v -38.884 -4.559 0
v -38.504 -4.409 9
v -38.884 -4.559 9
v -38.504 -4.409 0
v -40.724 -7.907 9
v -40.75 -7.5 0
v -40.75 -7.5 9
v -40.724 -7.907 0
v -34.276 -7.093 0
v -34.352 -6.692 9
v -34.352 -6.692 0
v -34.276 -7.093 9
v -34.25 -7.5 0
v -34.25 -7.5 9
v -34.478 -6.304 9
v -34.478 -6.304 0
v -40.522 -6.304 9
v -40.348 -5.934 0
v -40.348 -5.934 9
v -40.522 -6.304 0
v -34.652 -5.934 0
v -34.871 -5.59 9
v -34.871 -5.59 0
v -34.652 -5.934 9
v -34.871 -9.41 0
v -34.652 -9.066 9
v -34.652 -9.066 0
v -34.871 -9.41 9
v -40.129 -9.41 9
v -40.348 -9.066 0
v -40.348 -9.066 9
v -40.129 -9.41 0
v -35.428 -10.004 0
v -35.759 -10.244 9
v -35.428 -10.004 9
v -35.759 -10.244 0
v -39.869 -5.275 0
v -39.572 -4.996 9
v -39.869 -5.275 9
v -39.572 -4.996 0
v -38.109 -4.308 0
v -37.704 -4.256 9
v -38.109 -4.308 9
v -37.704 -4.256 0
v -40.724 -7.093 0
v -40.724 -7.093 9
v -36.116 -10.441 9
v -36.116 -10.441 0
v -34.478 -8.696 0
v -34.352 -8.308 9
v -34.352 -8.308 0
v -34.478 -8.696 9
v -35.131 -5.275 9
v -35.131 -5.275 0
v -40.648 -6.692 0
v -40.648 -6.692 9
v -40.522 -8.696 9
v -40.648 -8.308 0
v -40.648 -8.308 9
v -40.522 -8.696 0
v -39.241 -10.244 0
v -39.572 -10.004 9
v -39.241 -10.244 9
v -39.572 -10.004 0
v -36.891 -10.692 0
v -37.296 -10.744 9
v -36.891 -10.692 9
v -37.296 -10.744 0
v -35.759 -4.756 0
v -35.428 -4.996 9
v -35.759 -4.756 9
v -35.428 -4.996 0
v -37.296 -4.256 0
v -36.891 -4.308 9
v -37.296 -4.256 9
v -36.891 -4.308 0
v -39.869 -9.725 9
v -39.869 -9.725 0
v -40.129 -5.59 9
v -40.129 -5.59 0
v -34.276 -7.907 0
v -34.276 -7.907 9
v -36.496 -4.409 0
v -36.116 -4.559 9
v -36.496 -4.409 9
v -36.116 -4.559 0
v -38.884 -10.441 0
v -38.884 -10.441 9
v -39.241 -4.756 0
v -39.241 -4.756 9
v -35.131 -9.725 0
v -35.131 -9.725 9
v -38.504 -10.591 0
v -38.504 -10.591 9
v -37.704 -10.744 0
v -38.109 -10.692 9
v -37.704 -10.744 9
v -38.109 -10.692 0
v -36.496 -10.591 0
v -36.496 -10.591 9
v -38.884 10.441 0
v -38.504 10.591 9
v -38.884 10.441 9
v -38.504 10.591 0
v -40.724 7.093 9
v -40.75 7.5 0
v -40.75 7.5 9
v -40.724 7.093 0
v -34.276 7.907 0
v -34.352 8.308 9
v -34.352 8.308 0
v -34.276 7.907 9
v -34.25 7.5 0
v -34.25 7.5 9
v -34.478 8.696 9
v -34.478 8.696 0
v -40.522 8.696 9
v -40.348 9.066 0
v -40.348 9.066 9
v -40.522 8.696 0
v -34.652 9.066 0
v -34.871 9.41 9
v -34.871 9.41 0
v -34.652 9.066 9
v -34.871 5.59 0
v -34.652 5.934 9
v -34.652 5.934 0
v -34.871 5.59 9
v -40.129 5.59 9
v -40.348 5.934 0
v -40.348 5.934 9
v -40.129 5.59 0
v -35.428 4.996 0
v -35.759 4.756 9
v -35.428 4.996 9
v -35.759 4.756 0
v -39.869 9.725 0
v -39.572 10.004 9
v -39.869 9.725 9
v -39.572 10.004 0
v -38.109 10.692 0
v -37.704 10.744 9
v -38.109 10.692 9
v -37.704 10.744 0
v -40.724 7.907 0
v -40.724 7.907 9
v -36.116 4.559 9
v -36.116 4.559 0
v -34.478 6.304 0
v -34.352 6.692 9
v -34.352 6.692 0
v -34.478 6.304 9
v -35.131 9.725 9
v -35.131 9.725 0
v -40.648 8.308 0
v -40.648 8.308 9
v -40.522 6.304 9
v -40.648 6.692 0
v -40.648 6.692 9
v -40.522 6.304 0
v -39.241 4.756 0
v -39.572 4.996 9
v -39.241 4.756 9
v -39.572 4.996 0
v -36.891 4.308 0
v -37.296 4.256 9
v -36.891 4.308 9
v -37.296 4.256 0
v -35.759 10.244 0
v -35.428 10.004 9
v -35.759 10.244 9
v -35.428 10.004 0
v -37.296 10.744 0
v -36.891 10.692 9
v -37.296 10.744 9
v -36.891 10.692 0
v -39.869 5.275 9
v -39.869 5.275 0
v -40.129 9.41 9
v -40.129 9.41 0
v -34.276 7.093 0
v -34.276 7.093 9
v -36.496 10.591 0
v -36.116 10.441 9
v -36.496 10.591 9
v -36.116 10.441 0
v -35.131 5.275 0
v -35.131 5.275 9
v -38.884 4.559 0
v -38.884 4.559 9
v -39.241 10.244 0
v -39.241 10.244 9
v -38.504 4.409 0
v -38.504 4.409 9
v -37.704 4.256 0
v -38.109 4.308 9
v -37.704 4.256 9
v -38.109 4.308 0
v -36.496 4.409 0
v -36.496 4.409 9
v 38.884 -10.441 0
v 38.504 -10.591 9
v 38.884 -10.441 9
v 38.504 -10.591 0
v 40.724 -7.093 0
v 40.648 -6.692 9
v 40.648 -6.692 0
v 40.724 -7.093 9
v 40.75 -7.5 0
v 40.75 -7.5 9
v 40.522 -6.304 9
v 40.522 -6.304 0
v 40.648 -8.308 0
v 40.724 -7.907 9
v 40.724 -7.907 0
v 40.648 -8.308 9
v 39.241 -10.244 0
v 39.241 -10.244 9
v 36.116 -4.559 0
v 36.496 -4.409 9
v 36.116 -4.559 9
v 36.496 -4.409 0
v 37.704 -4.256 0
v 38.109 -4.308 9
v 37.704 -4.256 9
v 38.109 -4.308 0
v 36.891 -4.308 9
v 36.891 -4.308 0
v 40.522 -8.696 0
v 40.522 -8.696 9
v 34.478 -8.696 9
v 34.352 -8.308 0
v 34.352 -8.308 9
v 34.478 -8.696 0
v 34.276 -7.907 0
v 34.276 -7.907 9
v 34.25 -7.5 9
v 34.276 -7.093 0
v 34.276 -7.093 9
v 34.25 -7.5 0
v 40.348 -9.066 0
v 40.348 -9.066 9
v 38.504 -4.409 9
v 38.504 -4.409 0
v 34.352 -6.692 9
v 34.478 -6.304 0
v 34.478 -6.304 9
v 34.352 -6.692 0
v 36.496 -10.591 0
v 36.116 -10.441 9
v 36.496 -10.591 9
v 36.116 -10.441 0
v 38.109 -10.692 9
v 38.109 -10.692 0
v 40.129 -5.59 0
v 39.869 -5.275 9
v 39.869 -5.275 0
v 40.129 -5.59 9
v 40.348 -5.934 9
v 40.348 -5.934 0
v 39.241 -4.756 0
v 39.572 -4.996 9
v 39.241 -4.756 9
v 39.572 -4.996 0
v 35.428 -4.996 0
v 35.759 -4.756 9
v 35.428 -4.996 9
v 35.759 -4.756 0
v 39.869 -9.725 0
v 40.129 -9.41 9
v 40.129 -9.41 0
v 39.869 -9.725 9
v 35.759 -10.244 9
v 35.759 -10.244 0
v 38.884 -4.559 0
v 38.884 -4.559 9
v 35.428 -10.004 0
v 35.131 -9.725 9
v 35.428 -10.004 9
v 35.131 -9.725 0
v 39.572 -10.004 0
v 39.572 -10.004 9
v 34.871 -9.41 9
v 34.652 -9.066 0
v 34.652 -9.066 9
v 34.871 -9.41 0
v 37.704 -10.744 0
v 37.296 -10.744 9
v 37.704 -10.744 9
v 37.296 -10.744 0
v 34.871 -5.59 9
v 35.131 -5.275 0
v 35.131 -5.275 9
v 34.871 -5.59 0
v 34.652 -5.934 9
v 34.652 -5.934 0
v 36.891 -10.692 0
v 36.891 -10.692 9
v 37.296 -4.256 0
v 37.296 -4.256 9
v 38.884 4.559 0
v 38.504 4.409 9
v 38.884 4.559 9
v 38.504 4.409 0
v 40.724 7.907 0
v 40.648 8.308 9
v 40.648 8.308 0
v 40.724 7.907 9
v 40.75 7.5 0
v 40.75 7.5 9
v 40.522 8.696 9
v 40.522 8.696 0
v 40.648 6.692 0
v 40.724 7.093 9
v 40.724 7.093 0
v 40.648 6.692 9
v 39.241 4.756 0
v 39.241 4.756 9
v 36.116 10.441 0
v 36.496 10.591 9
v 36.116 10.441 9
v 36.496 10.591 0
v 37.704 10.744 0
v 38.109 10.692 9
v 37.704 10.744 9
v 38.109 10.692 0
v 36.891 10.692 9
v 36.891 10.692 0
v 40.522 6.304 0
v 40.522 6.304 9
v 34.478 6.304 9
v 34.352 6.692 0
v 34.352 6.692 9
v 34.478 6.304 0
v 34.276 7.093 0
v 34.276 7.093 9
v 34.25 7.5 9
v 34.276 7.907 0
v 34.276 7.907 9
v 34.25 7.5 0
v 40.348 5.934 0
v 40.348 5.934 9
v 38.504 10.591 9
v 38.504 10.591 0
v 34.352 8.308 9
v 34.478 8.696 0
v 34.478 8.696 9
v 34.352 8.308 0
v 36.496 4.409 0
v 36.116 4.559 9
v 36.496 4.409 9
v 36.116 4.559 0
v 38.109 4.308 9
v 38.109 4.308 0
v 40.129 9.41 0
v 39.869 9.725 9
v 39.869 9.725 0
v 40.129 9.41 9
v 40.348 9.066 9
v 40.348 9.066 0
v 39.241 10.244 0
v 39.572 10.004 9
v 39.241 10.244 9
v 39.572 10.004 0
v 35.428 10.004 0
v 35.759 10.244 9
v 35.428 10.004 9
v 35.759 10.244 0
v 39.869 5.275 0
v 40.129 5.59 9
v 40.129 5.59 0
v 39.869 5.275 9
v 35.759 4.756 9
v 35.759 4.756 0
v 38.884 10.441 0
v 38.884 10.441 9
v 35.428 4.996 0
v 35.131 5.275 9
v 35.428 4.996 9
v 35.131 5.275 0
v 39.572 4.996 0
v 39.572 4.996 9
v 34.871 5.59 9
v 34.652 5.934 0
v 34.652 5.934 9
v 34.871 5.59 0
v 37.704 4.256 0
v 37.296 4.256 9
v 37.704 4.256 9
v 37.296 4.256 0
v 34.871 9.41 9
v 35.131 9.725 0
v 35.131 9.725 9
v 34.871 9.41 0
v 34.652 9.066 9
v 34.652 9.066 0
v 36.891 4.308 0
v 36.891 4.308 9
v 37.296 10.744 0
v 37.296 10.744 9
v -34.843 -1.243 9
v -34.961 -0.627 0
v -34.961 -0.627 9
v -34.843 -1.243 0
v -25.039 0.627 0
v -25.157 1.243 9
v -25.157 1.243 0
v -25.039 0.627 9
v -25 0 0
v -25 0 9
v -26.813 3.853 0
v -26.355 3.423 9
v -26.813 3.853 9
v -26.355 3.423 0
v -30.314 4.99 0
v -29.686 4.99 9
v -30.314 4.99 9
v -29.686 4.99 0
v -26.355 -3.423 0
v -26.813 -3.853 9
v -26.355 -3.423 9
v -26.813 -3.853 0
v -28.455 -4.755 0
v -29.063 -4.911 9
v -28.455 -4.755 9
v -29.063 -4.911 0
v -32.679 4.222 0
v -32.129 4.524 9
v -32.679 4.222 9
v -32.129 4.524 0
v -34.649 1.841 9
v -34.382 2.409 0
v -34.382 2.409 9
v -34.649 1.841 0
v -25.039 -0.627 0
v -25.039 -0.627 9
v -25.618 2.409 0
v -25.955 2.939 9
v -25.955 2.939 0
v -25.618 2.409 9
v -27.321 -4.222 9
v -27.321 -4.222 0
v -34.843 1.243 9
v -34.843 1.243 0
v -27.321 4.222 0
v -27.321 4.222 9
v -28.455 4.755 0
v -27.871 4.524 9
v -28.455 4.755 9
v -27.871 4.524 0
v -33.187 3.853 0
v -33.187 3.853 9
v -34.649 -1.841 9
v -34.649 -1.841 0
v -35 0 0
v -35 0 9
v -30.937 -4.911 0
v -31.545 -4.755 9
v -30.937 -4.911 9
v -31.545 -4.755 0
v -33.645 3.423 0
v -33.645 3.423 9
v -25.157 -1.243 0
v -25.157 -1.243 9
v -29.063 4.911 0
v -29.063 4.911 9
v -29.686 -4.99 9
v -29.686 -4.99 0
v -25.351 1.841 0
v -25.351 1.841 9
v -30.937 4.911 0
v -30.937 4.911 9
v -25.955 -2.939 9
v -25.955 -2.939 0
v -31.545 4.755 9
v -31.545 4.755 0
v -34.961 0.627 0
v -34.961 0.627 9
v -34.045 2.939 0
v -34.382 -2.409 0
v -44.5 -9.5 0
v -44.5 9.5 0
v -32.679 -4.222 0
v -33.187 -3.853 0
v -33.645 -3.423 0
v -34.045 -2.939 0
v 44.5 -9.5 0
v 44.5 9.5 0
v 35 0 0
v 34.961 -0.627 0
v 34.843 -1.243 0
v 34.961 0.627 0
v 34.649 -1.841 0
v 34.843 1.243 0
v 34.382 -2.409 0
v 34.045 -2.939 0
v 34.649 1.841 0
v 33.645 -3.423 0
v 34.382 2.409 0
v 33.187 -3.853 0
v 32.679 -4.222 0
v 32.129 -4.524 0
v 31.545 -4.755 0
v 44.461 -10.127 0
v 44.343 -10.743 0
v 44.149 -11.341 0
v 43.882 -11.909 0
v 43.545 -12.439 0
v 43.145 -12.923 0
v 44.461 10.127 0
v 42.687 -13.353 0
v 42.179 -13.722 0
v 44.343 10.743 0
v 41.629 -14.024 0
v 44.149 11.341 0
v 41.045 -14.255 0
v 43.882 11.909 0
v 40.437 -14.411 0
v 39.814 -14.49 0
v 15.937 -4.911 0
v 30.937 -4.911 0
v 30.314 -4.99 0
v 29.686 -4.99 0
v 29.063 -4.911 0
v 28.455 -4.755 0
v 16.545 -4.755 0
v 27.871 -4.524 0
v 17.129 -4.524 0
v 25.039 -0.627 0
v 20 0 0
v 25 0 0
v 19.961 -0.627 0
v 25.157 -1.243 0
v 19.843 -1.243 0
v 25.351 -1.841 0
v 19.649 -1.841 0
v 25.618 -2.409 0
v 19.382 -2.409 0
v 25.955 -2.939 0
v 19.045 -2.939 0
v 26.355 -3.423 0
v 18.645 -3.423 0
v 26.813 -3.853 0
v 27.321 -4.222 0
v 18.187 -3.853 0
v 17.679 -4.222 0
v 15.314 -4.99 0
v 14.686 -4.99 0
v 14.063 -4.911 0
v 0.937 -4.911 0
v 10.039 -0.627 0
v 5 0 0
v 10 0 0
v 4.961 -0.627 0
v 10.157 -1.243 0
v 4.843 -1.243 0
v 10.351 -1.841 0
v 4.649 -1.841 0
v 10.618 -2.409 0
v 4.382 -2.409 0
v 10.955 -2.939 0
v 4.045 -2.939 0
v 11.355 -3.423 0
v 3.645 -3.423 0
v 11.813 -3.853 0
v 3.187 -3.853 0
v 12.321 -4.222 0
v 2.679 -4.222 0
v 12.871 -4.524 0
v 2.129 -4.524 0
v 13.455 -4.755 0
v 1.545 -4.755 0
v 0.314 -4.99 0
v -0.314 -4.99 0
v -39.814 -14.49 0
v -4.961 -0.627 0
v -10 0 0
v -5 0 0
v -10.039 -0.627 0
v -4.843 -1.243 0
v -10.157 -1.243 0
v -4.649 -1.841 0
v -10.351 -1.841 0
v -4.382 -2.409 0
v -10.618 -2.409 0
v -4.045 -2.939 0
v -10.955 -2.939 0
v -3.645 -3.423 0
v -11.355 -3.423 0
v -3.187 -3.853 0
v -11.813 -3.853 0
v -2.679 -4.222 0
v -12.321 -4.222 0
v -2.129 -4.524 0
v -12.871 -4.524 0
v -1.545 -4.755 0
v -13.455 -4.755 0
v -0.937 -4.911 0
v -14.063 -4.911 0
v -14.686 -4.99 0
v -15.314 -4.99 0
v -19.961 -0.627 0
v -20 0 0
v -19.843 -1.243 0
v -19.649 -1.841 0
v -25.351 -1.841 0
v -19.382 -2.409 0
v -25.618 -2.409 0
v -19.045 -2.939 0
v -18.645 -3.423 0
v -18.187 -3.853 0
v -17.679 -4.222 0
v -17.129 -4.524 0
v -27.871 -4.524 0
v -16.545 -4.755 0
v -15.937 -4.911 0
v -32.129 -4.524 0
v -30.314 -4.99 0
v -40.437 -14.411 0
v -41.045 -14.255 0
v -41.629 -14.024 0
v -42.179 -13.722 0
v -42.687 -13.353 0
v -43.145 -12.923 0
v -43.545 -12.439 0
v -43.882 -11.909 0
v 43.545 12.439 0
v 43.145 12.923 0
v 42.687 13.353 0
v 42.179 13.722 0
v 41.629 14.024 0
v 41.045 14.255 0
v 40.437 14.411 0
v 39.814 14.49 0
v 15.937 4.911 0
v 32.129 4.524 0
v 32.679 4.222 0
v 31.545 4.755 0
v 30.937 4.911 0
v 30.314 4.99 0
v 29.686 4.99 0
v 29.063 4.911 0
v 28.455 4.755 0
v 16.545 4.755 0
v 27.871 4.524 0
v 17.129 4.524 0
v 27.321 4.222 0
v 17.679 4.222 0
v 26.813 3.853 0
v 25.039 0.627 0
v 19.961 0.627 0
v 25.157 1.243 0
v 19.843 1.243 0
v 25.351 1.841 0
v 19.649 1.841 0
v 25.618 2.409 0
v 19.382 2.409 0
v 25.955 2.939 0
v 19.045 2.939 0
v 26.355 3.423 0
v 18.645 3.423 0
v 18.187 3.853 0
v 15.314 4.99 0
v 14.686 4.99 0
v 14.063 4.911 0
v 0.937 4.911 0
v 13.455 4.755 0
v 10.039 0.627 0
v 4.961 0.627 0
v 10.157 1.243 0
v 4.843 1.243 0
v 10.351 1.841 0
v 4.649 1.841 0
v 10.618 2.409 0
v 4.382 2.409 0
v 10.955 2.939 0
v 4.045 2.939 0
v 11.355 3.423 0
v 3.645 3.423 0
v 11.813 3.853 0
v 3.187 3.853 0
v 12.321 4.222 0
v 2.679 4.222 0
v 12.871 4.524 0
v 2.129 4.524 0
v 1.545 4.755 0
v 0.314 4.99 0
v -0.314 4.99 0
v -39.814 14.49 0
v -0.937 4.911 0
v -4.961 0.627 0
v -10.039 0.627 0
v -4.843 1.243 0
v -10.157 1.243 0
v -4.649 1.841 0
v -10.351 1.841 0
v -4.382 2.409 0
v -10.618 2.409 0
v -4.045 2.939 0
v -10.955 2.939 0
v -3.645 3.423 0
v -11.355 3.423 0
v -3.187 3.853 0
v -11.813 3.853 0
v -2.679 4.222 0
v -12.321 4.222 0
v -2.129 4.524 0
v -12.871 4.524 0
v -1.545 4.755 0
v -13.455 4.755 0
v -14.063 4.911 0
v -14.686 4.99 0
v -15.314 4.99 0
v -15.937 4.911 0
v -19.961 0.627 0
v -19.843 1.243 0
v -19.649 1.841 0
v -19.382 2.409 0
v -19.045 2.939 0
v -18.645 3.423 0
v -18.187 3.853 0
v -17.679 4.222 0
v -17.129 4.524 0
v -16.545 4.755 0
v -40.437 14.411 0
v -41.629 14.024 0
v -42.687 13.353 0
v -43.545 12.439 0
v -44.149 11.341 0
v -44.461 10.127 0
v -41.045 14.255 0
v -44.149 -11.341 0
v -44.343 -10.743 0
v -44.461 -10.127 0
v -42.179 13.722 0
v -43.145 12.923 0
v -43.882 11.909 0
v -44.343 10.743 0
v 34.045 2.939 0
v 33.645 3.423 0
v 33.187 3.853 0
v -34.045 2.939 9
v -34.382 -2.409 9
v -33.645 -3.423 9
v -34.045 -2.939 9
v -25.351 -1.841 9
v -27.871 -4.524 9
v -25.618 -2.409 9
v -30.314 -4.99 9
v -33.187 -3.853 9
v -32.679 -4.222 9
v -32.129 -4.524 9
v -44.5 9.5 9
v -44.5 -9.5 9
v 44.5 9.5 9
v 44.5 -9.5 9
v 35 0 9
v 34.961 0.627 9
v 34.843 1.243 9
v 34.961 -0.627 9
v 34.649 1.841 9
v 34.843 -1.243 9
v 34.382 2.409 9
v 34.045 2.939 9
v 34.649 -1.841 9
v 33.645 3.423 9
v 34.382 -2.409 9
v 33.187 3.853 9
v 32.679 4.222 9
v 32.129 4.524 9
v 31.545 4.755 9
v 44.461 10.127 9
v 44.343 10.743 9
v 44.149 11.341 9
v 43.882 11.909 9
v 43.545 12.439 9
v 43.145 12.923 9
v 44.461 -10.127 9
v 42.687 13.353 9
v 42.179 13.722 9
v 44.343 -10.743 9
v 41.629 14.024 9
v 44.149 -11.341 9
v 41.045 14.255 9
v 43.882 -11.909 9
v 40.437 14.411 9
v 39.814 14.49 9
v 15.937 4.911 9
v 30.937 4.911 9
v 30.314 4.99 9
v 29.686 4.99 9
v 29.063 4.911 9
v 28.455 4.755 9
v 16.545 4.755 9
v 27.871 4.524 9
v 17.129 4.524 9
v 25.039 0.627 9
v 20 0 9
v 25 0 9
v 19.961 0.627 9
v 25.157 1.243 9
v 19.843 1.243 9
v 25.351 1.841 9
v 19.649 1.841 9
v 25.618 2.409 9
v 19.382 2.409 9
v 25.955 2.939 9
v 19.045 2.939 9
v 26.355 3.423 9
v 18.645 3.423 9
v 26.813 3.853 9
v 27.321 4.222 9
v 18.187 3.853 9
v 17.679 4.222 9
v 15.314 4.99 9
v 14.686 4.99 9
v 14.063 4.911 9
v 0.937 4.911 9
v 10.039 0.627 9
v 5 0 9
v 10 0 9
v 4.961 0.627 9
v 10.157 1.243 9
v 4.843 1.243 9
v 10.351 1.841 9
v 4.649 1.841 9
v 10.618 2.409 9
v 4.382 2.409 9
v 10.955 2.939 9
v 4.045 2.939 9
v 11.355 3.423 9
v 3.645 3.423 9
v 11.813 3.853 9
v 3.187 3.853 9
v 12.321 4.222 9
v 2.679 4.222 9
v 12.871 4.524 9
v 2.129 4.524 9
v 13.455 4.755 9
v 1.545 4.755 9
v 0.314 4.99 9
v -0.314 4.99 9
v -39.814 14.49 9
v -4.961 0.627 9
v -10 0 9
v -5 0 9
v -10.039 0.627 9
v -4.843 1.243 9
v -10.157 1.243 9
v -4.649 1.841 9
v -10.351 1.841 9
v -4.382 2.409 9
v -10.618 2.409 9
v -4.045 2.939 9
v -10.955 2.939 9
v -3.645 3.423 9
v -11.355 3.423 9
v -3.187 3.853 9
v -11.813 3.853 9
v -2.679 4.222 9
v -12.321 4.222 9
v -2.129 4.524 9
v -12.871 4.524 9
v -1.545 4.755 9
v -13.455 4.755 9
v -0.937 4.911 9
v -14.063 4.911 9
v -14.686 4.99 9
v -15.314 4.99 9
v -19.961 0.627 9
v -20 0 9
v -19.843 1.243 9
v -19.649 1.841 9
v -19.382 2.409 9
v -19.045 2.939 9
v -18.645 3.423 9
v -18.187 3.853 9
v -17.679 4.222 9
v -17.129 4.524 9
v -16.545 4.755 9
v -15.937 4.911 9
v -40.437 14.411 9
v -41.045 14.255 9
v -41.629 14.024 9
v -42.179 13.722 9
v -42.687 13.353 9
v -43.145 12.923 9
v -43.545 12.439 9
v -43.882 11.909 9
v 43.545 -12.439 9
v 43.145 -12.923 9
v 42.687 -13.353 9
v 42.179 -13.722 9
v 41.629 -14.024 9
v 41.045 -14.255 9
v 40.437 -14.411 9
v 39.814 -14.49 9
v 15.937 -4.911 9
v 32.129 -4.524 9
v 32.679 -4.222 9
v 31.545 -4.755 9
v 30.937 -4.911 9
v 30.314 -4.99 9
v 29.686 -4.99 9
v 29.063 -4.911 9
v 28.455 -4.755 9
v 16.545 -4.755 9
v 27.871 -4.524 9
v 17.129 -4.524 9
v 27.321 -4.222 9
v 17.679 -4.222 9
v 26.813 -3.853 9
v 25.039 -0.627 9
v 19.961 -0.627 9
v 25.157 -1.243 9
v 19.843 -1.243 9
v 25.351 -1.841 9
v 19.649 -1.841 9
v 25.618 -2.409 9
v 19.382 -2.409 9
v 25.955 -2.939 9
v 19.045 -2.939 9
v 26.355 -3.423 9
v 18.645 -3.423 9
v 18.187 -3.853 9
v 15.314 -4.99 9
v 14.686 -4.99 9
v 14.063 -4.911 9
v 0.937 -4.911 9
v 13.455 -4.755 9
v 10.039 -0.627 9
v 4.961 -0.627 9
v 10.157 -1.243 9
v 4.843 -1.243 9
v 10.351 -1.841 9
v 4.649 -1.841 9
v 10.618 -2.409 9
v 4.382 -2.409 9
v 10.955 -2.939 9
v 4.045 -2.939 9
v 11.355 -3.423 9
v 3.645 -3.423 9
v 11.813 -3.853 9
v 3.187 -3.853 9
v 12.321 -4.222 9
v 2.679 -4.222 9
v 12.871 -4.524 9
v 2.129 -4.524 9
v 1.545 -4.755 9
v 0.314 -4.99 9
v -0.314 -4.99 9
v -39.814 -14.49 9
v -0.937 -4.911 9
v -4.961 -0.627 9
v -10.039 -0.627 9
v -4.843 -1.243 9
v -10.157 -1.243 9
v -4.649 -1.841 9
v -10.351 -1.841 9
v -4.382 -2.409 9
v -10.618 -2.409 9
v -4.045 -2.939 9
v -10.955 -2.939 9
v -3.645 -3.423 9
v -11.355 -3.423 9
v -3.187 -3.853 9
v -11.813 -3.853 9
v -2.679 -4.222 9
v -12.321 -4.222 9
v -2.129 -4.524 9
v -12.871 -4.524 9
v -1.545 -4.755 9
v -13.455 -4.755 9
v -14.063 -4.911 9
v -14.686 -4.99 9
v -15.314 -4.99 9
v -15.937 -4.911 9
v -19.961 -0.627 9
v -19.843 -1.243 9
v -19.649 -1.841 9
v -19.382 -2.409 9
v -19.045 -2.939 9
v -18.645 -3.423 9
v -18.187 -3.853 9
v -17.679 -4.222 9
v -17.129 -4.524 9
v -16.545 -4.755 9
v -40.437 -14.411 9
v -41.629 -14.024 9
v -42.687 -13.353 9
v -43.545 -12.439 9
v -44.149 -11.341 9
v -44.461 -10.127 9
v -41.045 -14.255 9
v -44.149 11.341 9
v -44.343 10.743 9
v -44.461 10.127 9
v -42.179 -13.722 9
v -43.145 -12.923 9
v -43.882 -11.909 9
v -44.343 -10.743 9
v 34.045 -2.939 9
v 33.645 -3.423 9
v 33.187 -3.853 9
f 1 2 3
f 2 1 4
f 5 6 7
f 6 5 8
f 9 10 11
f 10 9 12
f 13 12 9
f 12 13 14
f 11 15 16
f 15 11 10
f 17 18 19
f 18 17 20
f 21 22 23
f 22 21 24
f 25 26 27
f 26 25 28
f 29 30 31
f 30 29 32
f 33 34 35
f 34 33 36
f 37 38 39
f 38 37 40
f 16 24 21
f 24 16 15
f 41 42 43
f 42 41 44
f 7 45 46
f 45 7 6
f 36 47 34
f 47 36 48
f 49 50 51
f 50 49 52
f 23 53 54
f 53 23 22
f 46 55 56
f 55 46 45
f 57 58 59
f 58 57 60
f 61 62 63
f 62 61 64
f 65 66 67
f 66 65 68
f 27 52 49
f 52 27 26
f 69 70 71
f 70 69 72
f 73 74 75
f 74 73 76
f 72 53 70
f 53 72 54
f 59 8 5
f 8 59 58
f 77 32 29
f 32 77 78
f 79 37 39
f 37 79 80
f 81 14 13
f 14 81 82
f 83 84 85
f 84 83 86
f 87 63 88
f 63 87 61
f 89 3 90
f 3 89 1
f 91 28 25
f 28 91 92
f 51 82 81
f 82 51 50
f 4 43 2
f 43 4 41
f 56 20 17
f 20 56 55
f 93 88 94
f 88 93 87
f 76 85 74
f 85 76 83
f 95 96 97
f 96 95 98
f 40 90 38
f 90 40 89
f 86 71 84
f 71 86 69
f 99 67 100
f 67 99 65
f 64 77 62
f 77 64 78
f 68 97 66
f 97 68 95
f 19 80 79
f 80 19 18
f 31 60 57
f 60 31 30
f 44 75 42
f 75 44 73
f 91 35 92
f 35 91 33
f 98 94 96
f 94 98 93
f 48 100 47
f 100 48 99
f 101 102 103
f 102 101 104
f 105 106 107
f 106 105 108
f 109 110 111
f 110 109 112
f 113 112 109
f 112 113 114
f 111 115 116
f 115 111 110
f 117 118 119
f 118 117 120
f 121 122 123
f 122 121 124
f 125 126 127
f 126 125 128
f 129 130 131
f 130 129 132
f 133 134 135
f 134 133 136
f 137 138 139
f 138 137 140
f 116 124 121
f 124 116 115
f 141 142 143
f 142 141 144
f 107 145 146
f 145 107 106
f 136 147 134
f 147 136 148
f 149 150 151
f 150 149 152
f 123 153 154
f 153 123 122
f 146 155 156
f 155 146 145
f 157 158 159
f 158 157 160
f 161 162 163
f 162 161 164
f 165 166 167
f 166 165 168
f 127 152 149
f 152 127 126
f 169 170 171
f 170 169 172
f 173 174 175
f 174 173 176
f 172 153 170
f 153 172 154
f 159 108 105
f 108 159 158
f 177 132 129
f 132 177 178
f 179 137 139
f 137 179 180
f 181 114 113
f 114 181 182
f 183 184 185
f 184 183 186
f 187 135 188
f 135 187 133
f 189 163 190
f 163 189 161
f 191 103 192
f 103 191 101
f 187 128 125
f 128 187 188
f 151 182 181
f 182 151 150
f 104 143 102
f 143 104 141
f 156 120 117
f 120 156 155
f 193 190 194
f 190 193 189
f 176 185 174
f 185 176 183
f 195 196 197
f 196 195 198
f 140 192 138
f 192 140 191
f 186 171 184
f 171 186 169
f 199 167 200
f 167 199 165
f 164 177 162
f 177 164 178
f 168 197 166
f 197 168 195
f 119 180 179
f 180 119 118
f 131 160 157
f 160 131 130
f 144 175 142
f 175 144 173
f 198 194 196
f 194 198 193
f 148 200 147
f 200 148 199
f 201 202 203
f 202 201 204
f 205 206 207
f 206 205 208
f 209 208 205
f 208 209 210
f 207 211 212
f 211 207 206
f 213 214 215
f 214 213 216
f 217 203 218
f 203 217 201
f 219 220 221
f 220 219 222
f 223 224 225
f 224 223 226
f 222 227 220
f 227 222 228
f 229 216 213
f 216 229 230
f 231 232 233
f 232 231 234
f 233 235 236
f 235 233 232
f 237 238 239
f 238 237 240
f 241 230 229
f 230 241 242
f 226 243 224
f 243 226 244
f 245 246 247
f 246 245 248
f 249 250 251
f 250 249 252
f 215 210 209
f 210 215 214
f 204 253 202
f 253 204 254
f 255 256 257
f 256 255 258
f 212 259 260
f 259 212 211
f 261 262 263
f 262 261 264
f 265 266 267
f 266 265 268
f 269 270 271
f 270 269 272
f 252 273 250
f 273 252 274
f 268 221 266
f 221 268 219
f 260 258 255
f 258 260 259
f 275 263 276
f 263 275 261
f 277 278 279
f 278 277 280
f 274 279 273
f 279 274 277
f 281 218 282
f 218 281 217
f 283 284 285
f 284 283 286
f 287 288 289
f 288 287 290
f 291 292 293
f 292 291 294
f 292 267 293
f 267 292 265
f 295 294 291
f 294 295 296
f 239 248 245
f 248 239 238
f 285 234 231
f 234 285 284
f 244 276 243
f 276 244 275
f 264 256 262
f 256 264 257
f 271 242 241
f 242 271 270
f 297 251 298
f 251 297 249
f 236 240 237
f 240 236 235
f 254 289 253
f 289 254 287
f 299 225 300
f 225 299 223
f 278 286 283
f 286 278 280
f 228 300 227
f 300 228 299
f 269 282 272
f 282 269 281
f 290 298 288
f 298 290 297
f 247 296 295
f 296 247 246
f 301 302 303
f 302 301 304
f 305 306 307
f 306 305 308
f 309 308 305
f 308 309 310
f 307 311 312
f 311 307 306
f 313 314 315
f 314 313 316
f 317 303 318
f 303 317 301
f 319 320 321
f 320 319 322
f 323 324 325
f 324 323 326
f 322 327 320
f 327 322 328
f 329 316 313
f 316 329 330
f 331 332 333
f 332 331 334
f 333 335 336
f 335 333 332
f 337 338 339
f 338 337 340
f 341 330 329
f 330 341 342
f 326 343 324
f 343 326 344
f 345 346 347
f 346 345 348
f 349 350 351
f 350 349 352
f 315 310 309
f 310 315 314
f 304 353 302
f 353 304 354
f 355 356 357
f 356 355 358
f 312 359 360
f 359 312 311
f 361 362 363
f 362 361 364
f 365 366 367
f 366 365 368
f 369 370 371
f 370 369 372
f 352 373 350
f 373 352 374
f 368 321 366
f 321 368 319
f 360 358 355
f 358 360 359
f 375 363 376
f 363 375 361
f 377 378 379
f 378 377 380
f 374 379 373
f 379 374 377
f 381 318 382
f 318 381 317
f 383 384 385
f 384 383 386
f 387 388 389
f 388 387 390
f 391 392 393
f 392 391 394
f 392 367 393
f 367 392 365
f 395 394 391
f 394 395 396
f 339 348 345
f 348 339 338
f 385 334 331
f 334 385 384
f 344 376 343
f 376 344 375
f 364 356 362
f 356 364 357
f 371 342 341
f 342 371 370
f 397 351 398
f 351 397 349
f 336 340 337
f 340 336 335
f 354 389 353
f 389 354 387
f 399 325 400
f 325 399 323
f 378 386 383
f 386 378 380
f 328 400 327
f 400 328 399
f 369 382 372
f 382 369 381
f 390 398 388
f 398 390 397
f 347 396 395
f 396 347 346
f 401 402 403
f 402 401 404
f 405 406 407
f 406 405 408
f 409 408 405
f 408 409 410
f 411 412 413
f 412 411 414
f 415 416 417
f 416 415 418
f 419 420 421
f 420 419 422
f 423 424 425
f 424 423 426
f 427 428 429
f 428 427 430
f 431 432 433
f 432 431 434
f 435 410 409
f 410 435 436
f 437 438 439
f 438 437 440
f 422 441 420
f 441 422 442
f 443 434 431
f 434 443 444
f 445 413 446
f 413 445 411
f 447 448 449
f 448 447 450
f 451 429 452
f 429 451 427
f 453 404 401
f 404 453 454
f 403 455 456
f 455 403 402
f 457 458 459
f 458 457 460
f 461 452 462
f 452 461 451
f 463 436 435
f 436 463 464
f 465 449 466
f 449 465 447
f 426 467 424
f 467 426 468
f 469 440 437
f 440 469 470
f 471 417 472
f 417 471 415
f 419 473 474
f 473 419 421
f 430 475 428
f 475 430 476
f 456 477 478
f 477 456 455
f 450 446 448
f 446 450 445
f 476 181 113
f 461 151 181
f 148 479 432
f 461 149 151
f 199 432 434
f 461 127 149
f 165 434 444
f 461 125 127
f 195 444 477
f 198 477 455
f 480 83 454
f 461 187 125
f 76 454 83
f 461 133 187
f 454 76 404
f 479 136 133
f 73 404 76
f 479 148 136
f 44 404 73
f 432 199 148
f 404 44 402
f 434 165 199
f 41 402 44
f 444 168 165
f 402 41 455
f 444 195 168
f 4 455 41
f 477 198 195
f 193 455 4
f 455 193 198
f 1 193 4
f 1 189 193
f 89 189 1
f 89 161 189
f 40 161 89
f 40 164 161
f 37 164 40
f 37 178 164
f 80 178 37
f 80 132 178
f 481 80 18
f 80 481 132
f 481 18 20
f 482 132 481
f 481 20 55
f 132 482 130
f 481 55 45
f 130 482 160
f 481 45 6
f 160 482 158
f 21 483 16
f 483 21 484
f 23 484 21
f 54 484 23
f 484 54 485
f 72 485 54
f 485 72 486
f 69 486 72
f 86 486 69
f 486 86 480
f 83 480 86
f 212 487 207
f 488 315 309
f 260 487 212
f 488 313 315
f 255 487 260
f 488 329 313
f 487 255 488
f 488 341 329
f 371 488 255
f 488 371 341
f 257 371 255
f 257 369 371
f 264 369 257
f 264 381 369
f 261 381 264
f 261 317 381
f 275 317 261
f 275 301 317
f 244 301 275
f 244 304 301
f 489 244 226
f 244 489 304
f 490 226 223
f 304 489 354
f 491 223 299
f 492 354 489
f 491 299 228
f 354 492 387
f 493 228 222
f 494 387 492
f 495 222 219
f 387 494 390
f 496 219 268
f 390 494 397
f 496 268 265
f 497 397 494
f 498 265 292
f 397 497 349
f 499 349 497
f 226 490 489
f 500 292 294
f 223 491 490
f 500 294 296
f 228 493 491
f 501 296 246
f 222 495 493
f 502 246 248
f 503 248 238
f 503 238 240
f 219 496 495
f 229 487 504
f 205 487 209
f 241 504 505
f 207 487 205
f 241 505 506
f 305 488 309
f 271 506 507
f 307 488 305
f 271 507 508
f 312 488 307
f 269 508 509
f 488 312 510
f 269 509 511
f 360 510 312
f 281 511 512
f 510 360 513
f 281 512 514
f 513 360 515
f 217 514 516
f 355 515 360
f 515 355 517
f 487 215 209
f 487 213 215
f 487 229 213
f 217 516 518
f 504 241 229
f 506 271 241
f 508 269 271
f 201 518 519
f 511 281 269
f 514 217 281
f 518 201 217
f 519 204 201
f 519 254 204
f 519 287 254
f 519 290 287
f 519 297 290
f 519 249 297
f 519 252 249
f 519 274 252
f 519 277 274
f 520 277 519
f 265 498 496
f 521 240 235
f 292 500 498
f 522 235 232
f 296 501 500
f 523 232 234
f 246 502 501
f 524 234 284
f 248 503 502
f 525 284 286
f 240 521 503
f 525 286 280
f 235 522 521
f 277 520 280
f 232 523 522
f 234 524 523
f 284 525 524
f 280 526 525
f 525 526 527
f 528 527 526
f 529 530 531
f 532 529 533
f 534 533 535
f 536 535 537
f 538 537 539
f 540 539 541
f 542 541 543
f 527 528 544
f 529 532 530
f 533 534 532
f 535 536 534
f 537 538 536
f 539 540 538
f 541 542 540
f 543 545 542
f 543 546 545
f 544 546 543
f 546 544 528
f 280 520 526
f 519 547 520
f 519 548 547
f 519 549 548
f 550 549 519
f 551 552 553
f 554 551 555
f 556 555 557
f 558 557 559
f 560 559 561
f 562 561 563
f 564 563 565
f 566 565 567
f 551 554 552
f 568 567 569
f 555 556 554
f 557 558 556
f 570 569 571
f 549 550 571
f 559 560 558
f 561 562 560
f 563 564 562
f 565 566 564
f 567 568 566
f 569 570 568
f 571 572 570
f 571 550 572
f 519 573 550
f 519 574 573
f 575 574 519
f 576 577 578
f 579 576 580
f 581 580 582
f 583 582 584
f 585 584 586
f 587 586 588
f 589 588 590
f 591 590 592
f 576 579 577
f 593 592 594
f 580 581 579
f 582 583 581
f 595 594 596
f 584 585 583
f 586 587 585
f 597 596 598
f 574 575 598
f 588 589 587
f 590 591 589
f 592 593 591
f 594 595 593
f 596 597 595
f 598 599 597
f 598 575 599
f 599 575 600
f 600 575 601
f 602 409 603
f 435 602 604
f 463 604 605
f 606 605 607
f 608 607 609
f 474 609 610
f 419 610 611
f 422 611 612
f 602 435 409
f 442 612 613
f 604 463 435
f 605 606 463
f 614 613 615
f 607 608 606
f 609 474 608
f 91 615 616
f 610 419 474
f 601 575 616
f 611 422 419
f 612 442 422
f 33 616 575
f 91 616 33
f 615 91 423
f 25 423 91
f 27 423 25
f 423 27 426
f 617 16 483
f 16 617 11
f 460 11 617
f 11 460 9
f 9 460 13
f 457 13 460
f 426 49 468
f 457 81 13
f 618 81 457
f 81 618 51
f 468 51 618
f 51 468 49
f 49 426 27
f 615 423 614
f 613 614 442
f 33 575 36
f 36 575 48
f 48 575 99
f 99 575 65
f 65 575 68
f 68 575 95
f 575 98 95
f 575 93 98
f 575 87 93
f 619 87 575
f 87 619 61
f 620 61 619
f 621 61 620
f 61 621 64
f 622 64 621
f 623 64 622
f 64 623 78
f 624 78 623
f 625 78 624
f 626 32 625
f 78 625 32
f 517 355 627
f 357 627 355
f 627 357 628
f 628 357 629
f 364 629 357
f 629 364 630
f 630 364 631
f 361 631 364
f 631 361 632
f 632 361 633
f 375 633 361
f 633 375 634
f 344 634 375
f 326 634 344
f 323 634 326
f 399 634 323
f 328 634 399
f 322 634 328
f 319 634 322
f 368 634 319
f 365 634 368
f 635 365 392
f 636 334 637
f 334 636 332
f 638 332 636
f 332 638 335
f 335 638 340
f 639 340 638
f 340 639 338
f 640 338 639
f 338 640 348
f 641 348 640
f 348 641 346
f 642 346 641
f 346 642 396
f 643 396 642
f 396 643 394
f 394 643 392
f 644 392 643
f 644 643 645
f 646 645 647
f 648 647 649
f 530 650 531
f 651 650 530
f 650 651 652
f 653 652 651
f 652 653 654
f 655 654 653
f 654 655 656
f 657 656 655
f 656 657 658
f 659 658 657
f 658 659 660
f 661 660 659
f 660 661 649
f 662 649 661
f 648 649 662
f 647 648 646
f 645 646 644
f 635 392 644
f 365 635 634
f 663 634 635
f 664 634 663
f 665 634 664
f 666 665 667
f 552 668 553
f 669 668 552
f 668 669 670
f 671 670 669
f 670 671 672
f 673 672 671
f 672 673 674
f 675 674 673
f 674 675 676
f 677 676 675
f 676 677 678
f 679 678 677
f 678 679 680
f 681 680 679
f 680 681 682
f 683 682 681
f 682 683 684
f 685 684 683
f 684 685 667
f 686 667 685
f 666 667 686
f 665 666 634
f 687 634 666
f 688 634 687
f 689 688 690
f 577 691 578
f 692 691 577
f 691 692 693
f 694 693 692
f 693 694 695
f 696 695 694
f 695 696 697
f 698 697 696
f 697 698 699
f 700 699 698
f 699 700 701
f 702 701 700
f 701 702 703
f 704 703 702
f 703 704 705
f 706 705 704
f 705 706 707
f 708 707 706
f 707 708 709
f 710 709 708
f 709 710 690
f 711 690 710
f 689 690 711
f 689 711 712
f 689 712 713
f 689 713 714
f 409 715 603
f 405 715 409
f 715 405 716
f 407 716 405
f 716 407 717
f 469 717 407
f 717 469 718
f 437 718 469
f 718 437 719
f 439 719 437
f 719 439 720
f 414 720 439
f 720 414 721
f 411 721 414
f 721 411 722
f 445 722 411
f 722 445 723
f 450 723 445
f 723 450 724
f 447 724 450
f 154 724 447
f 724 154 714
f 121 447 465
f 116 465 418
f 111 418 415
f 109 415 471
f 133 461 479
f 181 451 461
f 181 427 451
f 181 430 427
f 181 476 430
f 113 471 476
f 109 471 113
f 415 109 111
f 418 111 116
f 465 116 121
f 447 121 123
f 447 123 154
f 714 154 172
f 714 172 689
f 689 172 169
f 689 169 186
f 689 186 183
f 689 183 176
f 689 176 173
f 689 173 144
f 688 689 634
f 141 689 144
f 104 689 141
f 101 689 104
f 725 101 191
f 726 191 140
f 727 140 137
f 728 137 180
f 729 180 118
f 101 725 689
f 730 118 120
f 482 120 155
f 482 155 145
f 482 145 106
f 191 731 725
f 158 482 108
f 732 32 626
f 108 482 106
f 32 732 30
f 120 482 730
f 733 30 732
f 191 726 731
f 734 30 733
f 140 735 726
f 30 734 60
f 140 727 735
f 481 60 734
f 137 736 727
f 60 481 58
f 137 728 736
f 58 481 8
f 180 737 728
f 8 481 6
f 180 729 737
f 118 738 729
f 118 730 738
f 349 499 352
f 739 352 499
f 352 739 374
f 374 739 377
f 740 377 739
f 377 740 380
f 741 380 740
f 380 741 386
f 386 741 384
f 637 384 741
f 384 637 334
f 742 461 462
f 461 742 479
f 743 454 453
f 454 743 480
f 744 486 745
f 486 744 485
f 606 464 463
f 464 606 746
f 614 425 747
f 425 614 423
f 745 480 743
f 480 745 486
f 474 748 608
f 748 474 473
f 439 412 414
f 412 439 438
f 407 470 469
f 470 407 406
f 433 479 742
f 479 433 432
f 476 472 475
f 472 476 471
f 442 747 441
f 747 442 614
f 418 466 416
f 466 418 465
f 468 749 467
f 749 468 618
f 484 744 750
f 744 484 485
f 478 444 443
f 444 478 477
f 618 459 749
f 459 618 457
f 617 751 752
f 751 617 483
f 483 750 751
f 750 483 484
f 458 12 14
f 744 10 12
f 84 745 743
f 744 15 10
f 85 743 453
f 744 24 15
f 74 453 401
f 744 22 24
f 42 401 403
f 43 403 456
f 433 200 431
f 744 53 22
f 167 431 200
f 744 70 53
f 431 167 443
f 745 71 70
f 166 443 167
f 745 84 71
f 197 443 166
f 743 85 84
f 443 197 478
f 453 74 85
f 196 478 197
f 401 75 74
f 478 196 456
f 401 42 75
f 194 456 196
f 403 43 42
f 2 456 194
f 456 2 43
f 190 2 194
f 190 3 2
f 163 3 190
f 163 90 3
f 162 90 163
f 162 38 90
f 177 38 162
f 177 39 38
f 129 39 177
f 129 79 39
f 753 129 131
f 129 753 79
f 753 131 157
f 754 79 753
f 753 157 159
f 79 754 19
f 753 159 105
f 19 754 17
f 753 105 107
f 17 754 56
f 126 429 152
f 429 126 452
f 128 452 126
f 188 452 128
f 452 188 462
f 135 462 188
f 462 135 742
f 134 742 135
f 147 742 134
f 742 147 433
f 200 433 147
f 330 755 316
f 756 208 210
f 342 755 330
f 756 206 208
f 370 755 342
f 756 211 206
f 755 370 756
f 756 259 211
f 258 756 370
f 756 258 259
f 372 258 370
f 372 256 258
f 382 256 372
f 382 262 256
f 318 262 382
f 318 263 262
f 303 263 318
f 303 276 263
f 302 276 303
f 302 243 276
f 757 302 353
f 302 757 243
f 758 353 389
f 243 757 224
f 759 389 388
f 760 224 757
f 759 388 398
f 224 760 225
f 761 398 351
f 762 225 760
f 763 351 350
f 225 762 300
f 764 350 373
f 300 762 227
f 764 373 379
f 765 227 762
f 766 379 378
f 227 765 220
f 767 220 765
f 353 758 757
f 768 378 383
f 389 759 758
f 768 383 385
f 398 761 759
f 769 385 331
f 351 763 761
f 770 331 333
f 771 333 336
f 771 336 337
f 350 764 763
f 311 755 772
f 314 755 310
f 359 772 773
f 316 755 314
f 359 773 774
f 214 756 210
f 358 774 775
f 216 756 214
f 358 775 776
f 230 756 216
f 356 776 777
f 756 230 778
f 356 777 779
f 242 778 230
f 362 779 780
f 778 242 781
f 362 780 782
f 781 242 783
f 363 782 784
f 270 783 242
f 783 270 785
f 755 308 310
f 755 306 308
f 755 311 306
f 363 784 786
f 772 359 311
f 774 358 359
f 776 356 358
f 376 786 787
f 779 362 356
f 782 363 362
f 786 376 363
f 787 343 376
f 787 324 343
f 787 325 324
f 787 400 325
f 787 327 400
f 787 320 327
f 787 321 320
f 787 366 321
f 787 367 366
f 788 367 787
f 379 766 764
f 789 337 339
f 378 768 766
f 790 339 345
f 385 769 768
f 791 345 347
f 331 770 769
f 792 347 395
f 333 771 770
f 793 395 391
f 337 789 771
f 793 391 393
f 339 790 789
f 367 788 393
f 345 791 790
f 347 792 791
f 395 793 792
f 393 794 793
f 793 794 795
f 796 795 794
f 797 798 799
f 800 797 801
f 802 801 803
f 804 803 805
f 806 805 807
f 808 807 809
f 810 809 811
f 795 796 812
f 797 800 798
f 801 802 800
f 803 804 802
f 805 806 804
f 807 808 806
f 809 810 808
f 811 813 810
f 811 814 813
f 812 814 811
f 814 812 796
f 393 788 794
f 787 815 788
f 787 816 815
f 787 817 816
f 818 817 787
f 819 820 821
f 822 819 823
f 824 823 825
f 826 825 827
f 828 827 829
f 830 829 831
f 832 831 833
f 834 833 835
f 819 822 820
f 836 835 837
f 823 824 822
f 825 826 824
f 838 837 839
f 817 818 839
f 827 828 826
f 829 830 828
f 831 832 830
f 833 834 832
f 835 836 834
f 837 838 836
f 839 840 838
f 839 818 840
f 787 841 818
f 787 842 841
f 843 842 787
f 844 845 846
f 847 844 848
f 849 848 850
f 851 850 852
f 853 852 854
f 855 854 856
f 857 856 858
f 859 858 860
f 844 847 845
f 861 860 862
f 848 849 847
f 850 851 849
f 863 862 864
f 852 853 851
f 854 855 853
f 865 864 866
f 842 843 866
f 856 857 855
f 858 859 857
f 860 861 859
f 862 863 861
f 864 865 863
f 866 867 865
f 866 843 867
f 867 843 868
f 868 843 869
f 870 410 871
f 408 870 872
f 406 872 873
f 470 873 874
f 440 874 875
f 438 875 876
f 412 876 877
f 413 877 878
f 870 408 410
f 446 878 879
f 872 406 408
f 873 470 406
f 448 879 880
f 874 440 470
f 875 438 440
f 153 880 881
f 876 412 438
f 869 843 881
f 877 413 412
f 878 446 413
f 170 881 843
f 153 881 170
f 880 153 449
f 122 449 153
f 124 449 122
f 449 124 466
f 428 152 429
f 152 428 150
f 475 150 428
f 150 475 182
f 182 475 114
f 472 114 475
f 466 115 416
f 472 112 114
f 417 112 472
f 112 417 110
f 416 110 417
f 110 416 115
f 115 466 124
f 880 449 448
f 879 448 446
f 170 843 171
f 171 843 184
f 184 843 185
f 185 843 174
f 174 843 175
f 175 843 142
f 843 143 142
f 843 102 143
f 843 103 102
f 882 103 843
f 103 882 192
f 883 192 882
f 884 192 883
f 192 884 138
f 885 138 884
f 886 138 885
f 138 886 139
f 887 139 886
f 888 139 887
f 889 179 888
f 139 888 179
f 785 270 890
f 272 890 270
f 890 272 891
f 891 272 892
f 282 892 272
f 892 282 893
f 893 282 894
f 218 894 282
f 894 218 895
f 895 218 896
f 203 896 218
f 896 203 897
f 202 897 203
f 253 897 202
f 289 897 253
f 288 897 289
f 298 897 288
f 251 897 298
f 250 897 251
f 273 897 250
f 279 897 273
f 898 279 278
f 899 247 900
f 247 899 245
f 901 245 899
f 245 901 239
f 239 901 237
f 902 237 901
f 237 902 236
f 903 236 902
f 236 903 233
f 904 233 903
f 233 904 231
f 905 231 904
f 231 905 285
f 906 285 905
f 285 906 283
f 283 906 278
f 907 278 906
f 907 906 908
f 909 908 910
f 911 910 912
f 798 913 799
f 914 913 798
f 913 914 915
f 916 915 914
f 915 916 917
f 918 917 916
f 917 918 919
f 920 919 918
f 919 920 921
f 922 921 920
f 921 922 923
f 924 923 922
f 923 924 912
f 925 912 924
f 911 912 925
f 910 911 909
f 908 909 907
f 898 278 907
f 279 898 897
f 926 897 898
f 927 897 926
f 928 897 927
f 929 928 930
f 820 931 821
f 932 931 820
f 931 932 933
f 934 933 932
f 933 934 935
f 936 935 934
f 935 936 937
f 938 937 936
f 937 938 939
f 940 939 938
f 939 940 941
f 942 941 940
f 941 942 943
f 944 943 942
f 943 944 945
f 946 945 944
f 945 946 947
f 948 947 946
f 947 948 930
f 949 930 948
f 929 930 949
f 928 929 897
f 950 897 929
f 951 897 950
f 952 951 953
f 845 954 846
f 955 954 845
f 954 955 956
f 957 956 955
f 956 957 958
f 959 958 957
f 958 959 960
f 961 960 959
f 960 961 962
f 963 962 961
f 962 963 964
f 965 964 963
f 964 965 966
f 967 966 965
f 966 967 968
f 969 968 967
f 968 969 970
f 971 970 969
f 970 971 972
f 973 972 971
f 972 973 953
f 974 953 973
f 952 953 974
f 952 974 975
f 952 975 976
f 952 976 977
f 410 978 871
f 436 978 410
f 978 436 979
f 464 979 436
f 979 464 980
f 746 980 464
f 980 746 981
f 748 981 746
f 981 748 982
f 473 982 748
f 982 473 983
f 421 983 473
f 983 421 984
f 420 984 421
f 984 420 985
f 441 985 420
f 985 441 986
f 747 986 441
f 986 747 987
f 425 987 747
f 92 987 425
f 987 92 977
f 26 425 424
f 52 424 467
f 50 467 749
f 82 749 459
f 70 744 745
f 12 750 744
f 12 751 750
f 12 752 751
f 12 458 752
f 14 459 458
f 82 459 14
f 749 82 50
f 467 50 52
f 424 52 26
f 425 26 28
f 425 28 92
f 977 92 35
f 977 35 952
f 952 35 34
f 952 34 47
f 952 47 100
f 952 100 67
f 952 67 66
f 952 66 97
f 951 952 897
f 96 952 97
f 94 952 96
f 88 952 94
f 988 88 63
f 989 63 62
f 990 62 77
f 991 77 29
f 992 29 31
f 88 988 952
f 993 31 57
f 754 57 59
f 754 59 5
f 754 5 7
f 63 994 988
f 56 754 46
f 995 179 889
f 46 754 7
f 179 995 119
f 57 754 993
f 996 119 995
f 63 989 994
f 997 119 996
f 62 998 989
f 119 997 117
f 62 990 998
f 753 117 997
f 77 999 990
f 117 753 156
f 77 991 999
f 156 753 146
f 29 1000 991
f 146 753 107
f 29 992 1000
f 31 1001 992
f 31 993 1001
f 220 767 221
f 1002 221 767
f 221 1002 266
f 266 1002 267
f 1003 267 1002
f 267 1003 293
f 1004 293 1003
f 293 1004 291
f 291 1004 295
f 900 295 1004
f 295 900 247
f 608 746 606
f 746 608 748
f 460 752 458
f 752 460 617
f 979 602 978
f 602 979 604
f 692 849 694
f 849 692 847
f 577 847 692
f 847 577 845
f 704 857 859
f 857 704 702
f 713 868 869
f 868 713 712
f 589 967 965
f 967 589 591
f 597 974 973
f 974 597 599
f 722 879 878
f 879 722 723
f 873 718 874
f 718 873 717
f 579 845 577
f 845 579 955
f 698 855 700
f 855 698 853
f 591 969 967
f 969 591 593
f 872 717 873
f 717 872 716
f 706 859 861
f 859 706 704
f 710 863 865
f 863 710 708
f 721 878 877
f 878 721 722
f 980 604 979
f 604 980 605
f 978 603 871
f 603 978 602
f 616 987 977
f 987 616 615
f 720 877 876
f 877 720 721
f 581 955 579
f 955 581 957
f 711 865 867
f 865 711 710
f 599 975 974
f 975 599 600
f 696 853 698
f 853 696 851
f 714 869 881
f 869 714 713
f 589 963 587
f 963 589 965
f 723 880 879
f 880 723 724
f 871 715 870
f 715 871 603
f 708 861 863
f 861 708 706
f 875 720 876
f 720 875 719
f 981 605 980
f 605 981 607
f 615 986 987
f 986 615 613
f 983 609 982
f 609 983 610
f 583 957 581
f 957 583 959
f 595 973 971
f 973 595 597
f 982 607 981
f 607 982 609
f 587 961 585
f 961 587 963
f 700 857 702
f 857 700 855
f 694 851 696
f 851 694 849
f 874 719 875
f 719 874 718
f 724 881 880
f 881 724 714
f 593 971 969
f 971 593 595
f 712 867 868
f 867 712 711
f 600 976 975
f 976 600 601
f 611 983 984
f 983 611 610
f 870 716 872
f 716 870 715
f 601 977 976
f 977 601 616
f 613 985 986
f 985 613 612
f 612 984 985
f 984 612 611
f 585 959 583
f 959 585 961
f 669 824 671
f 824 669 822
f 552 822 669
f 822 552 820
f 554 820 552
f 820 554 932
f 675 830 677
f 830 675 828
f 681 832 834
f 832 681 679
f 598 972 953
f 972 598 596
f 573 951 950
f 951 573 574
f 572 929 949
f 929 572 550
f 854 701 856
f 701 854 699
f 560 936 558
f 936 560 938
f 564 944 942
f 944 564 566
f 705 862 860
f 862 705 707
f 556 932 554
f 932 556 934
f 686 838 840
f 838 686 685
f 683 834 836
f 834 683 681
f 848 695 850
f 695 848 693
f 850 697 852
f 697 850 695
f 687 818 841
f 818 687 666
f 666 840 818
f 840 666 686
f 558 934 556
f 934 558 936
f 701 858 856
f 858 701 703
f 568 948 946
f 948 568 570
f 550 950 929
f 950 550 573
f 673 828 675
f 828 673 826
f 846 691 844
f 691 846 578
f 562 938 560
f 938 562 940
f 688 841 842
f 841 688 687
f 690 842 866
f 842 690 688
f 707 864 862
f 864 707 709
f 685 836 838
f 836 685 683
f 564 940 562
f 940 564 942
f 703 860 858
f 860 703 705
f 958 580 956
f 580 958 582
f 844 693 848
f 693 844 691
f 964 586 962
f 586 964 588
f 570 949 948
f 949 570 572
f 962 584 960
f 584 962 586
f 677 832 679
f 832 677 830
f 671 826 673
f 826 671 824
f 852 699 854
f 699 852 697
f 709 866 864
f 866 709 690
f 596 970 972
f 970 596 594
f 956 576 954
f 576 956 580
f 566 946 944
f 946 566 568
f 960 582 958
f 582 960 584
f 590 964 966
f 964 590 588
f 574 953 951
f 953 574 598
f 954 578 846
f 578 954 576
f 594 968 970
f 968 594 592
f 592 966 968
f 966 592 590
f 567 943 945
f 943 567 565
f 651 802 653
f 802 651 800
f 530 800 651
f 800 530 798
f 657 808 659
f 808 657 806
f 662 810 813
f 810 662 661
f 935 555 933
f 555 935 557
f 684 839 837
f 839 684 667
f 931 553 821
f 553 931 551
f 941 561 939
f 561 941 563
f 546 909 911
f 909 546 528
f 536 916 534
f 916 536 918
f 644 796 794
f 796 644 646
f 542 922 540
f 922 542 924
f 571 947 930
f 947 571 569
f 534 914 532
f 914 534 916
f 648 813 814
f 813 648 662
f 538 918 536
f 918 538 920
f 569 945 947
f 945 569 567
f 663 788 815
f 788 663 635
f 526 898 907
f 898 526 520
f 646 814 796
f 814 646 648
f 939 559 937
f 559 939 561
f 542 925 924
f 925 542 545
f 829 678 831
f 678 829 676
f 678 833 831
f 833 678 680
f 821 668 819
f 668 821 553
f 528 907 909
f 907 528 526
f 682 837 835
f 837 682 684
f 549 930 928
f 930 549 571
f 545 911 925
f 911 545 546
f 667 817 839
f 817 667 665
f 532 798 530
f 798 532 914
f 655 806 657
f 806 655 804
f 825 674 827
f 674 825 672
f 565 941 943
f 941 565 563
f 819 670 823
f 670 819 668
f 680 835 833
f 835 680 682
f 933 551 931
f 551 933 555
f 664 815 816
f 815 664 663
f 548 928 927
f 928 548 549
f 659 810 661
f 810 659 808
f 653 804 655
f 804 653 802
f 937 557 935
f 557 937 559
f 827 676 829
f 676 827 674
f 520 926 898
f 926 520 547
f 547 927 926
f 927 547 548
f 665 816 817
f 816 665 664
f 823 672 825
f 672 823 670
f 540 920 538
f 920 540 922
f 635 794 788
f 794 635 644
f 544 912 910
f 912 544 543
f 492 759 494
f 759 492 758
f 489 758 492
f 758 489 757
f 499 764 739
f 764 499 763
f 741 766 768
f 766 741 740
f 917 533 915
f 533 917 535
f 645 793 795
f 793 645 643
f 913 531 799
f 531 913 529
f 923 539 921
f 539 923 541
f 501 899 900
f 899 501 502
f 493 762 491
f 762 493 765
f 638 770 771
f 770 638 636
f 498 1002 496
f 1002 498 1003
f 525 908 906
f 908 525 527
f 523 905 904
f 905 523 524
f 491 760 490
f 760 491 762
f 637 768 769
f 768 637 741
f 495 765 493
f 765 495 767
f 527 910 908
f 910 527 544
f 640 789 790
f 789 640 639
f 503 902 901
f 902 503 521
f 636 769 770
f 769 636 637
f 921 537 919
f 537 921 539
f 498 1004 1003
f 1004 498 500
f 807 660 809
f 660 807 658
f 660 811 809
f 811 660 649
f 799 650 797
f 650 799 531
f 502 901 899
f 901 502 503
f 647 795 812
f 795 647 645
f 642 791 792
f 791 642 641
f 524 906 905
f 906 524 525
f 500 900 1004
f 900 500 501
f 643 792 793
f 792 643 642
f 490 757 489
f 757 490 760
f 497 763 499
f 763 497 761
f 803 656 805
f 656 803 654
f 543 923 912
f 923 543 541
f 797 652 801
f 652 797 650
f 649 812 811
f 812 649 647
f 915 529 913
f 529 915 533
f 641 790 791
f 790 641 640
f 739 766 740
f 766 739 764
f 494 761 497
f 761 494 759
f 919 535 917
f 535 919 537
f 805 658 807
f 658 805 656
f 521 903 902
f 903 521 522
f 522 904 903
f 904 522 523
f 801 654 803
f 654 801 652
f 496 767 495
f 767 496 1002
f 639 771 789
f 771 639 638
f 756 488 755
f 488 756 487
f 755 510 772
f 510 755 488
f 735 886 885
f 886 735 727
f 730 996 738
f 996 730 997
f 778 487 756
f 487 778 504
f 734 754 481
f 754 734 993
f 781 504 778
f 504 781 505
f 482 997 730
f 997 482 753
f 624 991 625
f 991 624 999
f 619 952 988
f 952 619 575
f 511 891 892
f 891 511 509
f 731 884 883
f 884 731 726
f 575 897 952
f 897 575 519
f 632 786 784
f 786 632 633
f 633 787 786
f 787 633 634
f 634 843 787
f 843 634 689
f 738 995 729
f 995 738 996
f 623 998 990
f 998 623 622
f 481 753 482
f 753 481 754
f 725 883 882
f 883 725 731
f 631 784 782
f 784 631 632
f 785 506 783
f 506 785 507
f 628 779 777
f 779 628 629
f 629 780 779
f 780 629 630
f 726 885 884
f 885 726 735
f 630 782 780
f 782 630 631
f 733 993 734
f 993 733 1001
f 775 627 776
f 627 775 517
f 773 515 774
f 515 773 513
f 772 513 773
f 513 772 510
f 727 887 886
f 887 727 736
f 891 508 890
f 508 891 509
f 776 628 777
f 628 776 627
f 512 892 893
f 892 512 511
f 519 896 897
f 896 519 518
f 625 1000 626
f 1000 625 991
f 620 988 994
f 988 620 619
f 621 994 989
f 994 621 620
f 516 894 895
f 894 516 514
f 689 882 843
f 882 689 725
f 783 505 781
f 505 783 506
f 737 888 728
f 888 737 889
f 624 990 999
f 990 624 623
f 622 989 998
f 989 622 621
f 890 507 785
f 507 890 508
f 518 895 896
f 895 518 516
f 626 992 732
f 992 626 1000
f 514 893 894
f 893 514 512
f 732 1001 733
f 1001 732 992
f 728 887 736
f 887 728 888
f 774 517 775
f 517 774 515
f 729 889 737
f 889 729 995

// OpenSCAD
$fn = 50;


difference() {
	union() {
		hull() {
			translate(v = [-39.5000000000, 9.5000000000, 0]) {
				cylinder(h = 9, r = 5);
			}
			translate(v = [39.5000000000, 9.5000000000, 0]) {
				cylinder(h = 9, r = 5);
			}
			translate(v = [-39.5000000000, -9.5000000000, 0]) {
				cylinder(h = 9, r = 5);
			}
			translate(v = [39.5000000000, -9.5000000000, 0]) {
				cylinder(h = 9, r = 5);
			}
		}
	}
	union() {
		#translate(v = [-37.5000000000, -7.5000000000, -100.0000000000]) {
			cylinder(h = 200, r = 3.2500000000);
		}
		#translate(v = [-37.5000000000, 7.5000000000, -100.0000000000]) {
			cylinder(h = 200, r = 3.2500000000);
		}
		#translate(v = [37.5000000000, -7.5000000000, -100.0000000000]) {
			cylinder(h = 200, r = 3.2500000000);
		}
		#translate(v = [37.5000000000, 7.5000000000, -100.0000000000]) {
			cylinder(h = 200, r = 3.2500000000);
		}
		#translate(v = [-30.0000000000, 0, 0]) {
			cylinder(h = 9, r = 5.0000000000);
		}
		#translate(v = [-15.0000000000, 0, 0]) {
			cylinder(h = 9, r = 5.0000000000);
		}
		#cylinder(h = 9, r = 5.0000000000);
		#translate(v = [15.0000000000, 0, 0]) {
			cylinder(h = 9, r = 5.0000000000);
		}
		#translate(v = [30.0000000000, 0, 0]) {
			cylinder(h = 9, r = 5.0000000000);
		}
	}
}
